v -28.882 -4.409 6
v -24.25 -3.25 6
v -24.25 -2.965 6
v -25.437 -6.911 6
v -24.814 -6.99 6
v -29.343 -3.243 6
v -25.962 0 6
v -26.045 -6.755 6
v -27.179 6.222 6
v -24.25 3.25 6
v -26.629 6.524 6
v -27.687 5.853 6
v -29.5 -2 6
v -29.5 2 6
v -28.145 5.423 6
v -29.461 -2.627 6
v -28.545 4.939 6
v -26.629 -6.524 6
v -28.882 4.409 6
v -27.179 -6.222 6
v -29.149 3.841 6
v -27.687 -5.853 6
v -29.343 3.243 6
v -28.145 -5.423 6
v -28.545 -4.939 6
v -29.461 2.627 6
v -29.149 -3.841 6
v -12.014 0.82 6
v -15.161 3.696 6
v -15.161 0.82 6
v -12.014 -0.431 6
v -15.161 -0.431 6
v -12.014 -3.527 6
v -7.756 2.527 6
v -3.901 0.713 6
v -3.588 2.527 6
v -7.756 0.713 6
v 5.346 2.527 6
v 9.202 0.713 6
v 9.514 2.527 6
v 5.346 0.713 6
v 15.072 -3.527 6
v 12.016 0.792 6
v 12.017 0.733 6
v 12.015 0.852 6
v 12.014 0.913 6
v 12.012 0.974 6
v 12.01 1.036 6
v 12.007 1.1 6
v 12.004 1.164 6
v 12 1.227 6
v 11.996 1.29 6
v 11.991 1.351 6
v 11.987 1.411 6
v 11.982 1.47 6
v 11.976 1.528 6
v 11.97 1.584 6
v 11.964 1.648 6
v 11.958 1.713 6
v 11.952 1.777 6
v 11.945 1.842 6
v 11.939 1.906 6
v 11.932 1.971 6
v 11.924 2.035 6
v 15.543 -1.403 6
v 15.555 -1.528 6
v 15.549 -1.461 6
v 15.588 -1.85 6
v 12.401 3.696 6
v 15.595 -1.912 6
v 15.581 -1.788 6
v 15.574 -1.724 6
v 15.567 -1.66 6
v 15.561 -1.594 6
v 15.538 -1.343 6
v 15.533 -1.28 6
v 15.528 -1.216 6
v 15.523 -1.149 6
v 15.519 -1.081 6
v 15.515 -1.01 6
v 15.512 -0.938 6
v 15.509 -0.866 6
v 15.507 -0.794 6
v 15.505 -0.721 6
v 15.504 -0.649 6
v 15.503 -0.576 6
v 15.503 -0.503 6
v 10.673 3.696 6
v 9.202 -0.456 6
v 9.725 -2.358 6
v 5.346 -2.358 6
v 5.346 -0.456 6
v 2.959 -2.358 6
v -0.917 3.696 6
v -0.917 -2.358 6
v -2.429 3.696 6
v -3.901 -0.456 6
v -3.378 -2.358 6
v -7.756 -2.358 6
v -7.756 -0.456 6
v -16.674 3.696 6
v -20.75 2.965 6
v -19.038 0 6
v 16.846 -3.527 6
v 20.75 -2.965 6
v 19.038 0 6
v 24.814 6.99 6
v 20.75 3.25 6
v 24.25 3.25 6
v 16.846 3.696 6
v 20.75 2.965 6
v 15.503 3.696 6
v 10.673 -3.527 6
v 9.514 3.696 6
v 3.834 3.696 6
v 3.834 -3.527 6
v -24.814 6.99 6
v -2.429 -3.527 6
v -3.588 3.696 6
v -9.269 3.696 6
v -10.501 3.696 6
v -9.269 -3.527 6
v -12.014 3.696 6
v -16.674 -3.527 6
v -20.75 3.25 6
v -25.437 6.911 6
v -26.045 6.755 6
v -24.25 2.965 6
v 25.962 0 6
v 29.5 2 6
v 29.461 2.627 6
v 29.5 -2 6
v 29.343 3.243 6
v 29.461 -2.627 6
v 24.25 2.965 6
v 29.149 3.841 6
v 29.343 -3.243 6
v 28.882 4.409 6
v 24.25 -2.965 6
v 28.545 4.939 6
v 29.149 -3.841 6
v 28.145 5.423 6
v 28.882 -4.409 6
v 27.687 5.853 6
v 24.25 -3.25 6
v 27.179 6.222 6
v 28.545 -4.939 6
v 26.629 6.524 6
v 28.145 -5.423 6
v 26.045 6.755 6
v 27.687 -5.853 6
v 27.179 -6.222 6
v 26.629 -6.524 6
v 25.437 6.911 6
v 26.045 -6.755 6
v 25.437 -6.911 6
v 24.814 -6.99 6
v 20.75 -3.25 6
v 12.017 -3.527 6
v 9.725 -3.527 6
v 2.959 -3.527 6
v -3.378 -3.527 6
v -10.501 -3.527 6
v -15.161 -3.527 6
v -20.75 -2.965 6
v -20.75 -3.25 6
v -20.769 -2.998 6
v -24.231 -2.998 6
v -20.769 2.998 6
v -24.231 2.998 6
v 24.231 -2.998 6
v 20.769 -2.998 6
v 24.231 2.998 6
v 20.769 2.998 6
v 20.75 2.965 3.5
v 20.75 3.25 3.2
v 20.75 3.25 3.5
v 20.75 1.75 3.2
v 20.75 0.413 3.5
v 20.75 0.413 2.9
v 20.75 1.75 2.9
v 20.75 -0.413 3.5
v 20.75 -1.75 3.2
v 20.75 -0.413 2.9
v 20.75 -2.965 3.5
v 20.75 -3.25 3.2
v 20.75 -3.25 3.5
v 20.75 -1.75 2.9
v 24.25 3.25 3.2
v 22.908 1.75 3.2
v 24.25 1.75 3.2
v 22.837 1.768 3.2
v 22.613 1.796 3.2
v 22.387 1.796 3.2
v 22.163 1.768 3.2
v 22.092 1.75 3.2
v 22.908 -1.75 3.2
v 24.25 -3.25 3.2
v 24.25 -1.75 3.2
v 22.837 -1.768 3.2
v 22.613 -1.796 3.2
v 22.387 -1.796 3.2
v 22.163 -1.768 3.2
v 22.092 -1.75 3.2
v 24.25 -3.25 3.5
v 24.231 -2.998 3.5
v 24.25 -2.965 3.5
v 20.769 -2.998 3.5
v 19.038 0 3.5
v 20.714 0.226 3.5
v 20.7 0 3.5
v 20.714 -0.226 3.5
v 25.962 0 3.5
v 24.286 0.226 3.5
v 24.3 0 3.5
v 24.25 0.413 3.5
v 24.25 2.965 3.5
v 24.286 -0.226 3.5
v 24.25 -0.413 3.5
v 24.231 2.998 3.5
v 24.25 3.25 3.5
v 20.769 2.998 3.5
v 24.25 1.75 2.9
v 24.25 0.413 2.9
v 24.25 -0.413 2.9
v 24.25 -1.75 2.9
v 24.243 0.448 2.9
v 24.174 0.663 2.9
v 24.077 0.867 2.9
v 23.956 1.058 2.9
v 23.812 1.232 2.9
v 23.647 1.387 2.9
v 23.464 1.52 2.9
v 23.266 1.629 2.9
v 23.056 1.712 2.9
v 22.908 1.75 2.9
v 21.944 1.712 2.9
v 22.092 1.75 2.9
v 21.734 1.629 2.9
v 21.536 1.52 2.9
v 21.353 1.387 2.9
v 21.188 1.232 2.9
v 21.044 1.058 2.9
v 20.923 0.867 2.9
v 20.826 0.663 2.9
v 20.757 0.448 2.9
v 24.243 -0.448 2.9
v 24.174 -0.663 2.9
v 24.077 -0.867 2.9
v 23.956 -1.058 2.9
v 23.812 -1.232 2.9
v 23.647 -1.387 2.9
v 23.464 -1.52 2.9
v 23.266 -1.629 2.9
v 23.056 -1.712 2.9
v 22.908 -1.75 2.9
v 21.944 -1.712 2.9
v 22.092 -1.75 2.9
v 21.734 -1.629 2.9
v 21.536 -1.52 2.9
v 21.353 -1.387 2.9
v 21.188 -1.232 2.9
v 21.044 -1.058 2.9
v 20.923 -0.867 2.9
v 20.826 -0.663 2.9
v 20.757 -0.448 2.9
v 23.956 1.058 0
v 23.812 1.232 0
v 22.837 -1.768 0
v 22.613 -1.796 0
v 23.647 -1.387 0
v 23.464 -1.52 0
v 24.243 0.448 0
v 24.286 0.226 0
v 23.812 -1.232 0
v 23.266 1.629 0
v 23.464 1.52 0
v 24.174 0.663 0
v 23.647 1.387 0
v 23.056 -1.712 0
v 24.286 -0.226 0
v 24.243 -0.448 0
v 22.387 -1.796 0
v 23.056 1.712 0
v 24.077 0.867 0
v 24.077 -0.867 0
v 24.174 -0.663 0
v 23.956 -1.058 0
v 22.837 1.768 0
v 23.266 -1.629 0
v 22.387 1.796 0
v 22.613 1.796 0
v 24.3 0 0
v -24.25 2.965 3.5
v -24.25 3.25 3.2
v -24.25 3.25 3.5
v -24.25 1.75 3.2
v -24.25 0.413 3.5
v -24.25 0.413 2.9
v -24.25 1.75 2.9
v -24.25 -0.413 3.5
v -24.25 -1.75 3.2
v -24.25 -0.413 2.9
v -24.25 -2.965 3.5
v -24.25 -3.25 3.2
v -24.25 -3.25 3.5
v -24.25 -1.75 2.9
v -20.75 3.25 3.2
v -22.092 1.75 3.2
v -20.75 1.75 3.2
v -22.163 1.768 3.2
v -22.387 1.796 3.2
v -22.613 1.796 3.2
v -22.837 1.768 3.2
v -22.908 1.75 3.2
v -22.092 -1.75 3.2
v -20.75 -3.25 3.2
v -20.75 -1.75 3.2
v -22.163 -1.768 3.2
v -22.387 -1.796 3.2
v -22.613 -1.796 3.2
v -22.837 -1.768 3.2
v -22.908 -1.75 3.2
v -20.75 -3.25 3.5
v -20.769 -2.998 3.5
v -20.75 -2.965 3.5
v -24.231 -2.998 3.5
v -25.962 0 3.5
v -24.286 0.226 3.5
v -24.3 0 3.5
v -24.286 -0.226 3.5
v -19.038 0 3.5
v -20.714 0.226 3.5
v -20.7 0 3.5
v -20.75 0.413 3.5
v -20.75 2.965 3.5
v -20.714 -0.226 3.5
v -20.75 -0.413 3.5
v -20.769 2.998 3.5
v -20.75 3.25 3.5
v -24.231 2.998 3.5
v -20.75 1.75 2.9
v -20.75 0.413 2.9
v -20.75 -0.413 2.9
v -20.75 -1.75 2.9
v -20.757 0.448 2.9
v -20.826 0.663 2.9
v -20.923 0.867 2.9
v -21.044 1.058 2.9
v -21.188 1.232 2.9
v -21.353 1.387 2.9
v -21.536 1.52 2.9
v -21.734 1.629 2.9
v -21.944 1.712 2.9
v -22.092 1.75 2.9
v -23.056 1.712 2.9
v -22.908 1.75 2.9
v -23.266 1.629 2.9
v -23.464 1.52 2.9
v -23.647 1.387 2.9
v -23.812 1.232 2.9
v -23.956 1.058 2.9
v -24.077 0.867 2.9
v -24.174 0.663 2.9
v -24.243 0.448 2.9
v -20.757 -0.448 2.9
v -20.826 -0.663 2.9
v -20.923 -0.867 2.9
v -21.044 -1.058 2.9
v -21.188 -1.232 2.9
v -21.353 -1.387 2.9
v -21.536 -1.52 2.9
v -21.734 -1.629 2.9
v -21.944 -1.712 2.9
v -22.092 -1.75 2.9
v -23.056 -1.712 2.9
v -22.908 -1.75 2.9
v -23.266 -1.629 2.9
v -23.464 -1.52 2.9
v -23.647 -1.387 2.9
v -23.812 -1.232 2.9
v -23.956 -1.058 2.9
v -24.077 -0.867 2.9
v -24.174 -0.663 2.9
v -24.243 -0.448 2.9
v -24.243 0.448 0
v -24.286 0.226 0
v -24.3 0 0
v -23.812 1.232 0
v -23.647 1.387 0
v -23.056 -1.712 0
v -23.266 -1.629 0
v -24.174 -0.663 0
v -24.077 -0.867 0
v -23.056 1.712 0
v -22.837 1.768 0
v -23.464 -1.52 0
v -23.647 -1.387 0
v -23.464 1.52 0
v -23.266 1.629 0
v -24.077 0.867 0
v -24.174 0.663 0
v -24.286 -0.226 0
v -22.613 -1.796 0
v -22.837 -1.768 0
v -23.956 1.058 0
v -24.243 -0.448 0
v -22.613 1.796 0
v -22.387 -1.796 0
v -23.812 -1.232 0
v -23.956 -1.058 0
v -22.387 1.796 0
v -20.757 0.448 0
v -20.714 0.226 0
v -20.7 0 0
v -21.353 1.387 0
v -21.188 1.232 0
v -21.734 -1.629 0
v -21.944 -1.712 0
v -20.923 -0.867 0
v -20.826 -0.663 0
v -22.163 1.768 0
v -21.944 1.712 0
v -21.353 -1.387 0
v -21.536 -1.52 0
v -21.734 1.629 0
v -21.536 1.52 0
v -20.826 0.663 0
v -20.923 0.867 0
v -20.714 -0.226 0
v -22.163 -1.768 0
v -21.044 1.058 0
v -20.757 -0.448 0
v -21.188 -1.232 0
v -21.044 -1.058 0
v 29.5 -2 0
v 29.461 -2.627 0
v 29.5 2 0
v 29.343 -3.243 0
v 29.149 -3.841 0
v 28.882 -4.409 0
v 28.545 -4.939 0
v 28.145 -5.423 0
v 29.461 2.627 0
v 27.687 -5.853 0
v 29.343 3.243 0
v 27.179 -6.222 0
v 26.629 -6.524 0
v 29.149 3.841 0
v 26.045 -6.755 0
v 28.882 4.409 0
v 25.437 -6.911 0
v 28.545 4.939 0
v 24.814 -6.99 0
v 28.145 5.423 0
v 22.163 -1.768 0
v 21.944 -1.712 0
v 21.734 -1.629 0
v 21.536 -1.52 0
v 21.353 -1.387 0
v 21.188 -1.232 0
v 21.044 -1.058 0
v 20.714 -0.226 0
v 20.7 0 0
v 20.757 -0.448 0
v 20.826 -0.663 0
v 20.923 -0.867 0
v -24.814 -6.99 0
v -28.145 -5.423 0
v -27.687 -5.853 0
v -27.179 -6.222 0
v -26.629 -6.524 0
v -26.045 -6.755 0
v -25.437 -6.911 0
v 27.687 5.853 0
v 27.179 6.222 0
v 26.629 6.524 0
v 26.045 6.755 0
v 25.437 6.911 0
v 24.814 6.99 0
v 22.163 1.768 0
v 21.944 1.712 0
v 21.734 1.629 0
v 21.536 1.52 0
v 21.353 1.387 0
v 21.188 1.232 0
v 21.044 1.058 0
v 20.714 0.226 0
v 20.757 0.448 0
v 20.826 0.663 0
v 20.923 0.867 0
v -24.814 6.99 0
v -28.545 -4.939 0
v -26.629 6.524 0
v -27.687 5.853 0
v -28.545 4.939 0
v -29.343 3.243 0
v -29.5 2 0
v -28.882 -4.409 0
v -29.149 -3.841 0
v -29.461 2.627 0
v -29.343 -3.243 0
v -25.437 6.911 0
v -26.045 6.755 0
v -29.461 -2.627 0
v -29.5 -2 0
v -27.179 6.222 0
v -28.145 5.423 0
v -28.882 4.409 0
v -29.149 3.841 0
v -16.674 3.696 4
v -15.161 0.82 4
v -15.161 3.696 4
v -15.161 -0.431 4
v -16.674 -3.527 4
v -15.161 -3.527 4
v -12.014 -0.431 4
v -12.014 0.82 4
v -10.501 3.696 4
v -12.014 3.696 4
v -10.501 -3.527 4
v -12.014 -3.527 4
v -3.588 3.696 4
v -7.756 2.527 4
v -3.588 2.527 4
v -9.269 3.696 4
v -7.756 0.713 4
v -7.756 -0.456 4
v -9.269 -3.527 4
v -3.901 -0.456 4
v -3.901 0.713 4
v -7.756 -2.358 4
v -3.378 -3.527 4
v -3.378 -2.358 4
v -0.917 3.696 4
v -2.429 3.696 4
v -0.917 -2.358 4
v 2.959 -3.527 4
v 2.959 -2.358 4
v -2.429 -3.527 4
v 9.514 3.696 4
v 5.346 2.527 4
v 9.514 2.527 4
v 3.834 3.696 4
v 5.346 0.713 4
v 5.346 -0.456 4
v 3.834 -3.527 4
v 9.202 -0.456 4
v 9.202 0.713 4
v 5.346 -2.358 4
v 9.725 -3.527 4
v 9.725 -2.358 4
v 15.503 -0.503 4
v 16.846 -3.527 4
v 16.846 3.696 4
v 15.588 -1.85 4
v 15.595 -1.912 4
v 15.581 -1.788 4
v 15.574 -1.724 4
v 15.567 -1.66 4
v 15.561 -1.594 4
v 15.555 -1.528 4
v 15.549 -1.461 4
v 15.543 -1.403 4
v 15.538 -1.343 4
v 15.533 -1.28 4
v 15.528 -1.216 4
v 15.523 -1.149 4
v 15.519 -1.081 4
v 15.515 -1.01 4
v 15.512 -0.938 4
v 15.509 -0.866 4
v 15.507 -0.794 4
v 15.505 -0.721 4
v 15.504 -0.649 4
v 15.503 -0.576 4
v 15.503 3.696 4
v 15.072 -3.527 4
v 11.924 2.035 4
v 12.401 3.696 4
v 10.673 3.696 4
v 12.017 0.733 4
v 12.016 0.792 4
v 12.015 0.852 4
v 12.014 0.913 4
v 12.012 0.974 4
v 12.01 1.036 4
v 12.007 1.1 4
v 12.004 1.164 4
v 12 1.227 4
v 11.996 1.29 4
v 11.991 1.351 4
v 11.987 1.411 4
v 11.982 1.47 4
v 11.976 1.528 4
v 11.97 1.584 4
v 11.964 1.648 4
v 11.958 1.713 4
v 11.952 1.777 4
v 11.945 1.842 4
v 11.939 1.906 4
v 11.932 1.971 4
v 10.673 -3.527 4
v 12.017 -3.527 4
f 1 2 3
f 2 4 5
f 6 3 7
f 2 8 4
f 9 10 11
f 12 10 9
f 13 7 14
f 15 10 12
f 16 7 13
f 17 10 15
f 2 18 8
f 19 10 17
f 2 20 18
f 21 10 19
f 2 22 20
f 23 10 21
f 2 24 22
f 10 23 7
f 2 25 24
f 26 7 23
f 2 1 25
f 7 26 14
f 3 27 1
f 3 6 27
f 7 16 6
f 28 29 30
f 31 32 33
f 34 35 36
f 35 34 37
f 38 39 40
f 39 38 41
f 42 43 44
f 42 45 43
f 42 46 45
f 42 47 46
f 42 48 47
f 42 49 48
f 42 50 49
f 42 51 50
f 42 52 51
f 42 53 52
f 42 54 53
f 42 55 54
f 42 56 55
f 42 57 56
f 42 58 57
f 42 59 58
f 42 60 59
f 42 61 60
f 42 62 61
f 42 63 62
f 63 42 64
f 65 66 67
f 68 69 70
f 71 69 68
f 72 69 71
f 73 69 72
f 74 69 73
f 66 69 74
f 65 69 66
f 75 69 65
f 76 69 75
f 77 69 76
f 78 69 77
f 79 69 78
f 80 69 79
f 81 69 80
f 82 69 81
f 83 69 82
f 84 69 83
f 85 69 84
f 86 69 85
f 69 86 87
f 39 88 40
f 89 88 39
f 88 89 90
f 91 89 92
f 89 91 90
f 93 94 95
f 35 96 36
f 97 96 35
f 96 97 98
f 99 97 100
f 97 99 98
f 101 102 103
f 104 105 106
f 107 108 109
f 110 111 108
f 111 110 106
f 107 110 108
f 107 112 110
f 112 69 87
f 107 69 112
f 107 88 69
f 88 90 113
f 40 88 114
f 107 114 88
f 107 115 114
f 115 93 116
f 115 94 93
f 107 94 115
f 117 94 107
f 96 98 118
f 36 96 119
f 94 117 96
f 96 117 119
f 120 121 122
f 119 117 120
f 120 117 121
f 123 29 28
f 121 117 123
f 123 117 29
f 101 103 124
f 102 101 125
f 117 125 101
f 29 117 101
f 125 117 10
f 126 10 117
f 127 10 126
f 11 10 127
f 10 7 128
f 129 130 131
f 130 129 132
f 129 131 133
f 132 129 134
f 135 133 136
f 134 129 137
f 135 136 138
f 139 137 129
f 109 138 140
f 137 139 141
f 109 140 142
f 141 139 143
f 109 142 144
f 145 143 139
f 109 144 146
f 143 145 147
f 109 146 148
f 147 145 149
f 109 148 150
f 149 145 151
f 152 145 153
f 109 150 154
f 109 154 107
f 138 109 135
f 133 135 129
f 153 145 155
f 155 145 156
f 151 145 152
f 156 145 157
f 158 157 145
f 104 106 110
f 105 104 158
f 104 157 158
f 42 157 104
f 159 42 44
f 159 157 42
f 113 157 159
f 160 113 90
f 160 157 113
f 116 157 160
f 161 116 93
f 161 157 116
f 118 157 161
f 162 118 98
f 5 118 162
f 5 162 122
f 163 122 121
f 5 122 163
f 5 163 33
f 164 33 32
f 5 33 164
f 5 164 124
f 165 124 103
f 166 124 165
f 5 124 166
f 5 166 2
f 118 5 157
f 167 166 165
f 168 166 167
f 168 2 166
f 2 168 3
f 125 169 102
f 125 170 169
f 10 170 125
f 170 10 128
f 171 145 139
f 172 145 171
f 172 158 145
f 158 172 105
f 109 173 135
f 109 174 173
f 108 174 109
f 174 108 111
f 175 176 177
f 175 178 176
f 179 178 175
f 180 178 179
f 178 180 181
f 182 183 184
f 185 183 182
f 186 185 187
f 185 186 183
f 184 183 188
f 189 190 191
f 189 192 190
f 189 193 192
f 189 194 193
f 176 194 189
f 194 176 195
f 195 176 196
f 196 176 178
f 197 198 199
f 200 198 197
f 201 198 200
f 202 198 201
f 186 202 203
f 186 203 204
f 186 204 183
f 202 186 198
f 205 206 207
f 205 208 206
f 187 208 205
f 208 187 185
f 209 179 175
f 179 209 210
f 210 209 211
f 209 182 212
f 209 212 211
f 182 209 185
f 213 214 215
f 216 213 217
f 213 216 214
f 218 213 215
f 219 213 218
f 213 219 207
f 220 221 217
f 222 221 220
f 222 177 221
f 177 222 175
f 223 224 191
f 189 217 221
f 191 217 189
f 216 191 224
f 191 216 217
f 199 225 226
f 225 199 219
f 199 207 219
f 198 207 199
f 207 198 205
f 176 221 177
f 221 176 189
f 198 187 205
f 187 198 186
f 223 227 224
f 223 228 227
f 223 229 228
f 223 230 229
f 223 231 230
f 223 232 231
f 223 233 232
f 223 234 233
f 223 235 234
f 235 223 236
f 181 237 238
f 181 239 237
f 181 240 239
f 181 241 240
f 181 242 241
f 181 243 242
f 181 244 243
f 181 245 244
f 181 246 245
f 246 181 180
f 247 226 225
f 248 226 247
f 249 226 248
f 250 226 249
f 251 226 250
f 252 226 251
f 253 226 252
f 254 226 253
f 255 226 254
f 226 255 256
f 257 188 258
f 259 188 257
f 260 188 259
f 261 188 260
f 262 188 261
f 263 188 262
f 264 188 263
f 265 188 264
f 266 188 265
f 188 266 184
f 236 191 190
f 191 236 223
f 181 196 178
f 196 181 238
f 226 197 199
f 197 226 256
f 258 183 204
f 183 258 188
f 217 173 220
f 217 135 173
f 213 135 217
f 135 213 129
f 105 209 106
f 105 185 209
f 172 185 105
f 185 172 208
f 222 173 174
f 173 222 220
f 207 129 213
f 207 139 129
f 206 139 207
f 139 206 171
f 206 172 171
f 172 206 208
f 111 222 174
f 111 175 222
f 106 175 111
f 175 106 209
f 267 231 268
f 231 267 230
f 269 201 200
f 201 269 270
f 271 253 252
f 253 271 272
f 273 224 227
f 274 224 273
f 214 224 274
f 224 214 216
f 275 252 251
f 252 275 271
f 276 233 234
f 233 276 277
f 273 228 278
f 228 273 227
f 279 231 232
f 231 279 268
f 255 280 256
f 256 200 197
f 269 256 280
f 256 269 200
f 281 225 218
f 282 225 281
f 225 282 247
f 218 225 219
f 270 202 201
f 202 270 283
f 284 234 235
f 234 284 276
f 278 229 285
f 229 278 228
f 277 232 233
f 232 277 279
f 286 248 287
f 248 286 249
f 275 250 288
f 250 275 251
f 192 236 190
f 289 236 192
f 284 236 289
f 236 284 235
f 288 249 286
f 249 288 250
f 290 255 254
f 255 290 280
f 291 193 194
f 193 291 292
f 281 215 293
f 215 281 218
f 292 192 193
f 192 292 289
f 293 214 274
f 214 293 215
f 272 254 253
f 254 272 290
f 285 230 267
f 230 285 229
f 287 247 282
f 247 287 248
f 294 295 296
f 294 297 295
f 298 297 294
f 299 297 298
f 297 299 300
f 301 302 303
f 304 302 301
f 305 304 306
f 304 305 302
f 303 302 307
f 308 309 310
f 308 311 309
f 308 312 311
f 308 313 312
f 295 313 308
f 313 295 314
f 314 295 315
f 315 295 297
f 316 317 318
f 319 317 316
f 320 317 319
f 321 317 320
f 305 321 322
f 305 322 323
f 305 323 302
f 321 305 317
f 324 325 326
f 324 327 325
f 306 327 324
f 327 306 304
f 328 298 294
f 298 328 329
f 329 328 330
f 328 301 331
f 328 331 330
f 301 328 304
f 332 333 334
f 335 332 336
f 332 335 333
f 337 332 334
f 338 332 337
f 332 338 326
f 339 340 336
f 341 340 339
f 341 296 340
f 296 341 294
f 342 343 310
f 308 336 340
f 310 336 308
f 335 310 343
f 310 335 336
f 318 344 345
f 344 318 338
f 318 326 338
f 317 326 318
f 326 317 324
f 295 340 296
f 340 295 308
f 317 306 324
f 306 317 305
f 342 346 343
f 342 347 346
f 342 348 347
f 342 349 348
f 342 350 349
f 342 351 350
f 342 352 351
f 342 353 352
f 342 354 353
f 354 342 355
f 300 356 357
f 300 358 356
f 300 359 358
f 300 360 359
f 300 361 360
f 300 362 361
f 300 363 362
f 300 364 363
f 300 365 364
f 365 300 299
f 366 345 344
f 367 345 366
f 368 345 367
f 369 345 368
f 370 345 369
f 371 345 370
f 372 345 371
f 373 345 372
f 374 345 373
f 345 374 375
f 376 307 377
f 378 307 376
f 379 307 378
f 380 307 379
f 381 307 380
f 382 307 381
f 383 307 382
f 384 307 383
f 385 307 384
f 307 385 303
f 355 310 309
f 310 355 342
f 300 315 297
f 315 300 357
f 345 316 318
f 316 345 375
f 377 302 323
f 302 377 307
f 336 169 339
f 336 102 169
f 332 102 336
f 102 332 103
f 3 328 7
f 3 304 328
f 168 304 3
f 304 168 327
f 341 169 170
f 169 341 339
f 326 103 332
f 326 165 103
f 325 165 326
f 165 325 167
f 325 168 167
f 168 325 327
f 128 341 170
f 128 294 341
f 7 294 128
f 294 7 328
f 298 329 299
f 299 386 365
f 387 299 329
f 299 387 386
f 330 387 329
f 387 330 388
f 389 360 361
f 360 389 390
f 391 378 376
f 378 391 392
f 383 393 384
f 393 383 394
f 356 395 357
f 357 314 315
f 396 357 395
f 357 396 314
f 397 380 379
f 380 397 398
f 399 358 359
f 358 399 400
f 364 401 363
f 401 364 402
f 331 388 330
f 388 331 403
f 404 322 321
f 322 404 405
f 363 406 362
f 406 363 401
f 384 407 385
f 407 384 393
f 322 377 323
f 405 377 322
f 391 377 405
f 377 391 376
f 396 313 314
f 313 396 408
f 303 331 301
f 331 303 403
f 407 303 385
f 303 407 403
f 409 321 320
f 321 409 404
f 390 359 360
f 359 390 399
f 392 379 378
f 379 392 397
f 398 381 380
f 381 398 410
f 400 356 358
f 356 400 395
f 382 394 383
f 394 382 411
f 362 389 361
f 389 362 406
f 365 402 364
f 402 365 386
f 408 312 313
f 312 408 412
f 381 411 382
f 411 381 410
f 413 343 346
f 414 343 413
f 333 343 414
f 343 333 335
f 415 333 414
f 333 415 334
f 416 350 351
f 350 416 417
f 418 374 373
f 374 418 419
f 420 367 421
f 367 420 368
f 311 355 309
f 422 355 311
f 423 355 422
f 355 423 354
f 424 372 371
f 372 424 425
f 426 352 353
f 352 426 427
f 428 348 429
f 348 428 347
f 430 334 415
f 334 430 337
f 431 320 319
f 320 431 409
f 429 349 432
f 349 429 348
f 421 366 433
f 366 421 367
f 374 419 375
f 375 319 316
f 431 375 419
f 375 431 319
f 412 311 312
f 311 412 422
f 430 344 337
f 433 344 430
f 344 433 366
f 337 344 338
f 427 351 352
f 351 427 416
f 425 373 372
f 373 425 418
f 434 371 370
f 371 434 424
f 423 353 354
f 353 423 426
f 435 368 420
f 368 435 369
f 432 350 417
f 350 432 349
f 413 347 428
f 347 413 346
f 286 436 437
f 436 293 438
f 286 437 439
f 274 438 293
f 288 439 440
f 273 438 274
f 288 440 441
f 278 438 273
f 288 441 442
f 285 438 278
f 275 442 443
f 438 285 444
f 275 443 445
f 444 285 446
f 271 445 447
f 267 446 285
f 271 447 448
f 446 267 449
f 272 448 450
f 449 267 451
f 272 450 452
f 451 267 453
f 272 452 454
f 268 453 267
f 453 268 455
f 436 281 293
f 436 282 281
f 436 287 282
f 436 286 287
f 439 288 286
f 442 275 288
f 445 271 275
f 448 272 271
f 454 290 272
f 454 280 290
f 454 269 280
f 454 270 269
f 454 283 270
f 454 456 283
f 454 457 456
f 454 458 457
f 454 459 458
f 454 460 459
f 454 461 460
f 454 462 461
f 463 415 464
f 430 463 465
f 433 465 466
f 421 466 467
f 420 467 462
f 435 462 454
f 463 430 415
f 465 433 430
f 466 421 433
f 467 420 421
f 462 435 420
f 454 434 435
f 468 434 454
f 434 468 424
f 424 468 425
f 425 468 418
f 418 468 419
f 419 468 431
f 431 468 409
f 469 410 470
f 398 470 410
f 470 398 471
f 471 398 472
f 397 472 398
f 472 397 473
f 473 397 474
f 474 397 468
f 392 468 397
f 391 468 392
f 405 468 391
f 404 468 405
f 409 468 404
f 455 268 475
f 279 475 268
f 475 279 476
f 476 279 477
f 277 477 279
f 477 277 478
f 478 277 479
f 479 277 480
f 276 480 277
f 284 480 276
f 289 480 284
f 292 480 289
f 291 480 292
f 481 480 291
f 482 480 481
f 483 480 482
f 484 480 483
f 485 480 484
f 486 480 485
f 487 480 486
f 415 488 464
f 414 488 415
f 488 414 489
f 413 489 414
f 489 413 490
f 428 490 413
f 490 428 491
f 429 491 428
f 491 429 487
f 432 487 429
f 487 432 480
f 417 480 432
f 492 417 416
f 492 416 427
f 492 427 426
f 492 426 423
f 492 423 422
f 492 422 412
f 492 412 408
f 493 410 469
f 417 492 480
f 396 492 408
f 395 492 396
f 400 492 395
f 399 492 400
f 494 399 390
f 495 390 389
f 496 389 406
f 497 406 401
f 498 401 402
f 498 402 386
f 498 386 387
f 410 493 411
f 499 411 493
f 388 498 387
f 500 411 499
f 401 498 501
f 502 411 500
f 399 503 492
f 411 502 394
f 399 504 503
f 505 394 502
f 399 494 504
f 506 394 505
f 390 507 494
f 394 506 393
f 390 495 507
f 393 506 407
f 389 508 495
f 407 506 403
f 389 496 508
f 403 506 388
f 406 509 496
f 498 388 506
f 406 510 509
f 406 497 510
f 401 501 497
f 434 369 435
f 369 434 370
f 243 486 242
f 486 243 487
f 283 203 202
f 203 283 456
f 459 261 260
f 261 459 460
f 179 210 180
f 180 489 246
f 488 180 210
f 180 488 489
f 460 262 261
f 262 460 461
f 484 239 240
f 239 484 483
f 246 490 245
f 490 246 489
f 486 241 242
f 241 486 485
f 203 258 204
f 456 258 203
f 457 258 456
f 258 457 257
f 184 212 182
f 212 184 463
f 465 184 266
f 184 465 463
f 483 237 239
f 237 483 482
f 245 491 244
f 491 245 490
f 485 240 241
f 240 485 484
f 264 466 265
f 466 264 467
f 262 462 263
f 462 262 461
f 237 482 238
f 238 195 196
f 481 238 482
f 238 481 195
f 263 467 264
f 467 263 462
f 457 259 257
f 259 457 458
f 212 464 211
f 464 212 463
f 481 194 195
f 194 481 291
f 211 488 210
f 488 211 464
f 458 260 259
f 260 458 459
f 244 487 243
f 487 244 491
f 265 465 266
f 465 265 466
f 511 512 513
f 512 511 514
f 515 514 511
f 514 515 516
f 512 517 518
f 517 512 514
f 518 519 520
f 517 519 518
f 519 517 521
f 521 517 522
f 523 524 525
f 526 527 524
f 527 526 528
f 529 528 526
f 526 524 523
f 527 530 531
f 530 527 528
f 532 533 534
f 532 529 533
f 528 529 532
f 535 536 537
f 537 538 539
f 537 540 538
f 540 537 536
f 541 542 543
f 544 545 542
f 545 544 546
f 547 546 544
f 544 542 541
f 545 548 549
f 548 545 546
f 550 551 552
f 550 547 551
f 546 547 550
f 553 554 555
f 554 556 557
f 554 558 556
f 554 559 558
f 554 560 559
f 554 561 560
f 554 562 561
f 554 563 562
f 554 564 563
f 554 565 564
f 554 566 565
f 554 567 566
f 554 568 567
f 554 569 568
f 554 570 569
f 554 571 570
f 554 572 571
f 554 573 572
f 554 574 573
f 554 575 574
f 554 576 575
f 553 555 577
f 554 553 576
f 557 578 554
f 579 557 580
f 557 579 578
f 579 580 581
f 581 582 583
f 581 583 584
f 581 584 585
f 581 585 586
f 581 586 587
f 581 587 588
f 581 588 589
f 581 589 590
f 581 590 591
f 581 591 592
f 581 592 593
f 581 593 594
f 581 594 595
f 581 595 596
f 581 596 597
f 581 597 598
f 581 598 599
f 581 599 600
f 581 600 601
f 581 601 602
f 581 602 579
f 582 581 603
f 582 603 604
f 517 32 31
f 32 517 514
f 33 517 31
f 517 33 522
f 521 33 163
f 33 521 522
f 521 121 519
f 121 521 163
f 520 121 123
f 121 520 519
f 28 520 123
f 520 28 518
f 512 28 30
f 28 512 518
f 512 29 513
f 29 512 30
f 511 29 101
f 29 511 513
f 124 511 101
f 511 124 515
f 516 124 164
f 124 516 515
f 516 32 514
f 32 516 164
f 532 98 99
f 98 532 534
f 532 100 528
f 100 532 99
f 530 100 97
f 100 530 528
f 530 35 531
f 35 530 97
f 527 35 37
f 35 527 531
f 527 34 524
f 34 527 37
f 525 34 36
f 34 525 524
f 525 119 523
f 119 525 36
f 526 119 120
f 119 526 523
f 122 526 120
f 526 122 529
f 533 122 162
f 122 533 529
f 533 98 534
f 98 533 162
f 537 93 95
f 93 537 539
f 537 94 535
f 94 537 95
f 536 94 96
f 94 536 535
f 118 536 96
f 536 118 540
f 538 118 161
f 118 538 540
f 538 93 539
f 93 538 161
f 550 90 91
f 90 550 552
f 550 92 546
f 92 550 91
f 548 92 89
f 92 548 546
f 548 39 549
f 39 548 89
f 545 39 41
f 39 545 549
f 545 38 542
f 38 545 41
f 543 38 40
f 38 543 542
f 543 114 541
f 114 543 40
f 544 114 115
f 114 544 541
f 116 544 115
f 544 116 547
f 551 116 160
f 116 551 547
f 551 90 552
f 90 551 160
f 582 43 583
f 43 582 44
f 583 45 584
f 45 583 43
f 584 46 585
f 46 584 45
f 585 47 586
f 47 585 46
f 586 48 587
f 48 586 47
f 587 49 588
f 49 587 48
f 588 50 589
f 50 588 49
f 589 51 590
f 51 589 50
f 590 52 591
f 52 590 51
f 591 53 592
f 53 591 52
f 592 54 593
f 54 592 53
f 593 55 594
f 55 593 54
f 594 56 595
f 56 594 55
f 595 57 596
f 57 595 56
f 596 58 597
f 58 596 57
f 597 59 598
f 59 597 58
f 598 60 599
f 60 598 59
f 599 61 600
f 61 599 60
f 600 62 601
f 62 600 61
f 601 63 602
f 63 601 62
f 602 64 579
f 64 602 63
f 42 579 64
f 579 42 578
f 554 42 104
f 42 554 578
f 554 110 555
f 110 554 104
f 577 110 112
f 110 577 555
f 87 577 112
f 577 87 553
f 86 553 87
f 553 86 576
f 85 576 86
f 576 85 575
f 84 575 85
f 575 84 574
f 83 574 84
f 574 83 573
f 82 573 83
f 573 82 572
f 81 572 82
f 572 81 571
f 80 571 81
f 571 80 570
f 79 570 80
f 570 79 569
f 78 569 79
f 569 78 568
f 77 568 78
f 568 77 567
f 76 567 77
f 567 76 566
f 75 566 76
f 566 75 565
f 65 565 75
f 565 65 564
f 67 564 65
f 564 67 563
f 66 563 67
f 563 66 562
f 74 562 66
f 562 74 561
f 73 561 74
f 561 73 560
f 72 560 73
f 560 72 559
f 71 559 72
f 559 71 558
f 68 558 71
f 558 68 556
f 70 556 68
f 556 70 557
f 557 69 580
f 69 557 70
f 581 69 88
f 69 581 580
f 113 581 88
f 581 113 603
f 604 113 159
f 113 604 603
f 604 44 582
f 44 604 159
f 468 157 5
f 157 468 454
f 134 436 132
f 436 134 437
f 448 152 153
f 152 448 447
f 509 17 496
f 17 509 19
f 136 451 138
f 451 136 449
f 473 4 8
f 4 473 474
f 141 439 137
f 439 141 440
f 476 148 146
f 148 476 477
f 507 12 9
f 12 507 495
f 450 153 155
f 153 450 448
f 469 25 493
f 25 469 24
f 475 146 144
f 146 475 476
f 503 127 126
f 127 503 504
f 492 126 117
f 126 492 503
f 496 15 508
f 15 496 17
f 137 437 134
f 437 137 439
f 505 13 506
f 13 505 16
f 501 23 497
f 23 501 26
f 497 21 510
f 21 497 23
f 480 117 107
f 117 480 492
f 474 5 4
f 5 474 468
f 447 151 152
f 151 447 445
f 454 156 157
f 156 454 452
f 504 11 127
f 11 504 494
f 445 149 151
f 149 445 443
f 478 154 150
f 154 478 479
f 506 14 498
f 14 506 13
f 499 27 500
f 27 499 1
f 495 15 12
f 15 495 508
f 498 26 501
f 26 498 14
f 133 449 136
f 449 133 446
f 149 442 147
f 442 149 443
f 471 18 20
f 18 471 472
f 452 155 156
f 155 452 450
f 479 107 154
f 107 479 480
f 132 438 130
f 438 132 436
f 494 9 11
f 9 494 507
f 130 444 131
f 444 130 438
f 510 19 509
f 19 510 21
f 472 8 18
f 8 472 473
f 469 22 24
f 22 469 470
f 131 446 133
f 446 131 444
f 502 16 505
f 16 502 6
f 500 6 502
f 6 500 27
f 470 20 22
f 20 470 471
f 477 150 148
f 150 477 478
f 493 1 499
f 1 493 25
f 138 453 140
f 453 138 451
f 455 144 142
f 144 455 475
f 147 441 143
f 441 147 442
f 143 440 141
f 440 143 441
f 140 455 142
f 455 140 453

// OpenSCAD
$fn = 50;


difference() {
	union() {
		hull() {
			translate(v = [-24.5000000000, 2.0000000000, 0]) {
				cylinder(h = 6, r = 5);
			}
			translate(v = [24.5000000000, 2.0000000000, 0]) {
				cylinder(h = 6, r = 5);
			}
			translate(v = [-24.5000000000, -2.0000000000, 0]) {
				cylinder(h = 6, r = 5);
			}
			translate(v = [24.5000000000, -2.0000000000, 0]) {
				cylinder(h = 6, r = 5);
			}
		}
	}
	union() {
		translate(v = [22.5000000000, 0, -20]) {
			rotate(a = [0, 180, 0]) {
				difference() {
					union() {
						translate(v = [0, 0, -26.0000000000]) {
							rotate(a = [0, 0, 0]) {
								difference() {
									union() {
										#translate(v = [-1.7500000000, -3.2500000000, -0.3000000000]) {
											cube(size = [3.5000000000, 6.5000000000, 0.3000000000]);
										}
										#translate(v = [-1.7500000000, -1.7500000000, -0.6000000000]) {
											cube(size = [3.5000000000, 3.5000000000, 0.3000000000]);
										}
										#translate(v = [-1.7500000000, -3.2500000000, 2.5000000000]) {
											cube(size = [3.5000000000, 6.5000000000, 0.3000000000]);
										}
										#translate(v = [-1.7500000000, -1.7500000000, 2.8000000000]) {
											cube(size = [3.5000000000, 3.5000000000, 0.3000000000]);
										}
										#linear_extrude(height = 2.5000000000) {
											polygon(points = [[3.4620000000, 0.0000000000], [1.7310000000, 2.9981799479], [-1.7310000000, 2.9981799479], [-3.4620000000, 0.0000000000], [-1.7310000000, -2.9981799479], [1.7310000000, -2.9981799479]]);
										}
										#translate(v = [-1.7500000000, -3.2500000000, -0.3000000000]) {
											cube(size = [3.5000000000, 6.5000000000, 0.3000000000]);
										}
										#translate(v = [-1.7500000000, -1.7500000000, -0.6000000000]) {
											cube(size = [3.5000000000, 3.5000000000, 0.3000000000]);
										}
										#translate(v = [-1.7500000000, -3.2500000000, 2.5000000000]) {
											cube(size = [3.5000000000, 6.5000000000, 0.3000000000]);
										}
										#translate(v = [-1.7500000000, -1.7500000000, 2.8000000000]) {
											cube(size = [3.5000000000, 3.5000000000, 0.3000000000]);
										}
										#translate(v = [-1.7500000000, -3.2500000000, -0.3000000000]) {
											cube(size = [3.5000000000, 6.5000000000, 0.3000000000]);
										}
										#translate(v = [-1.7500000000, -1.7500000000, -0.6000000000]) {
											cube(size = [3.5000000000, 3.5000000000, 0.3000000000]);
										}
										#translate(v = [-1.7500000000, -3.2500000000, 2.5000000000]) {
											cube(size = [3.5000000000, 6.5000000000, 0.3000000000]);
										}
										#translate(v = [-1.7500000000, -1.7500000000, 2.8000000000]) {
											cube(size = [3.5000000000, 3.5000000000, 0.3000000000]);
										}
									}
									union();
								}
							}
						}
						translate(v = [0, 0, -26.0000000000]) {
							rotate(a = [0, 0, 0]) {
								difference() {
									union() {
										#translate(v = [-1.7500000000, -3.2500000000, -0.3000000000]) {
											cube(size = [3.5000000000, 6.5000000000, 0.3000000000]);
										}
										#translate(v = [-1.7500000000, -1.7500000000, -0.6000000000]) {
											cube(size = [3.5000000000, 3.5000000000, 0.3000000000]);
										}
										#translate(v = [-1.7500000000, -3.2500000000, 2.5000000000]) {
											cube(size = [3.5000000000, 6.5000000000, 0.3000000000]);
										}
										#translate(v = [-1.7500000000, -1.7500000000, 2.8000000000]) {
											cube(size = [3.5000000000, 3.5000000000, 0.3000000000]);
										}
										#linear_extrude(height = 2.5000000000) {
											polygon(points = [[3.4620000000, 0.0000000000], [1.7310000000, 2.9981799479], [-1.7310000000, 2.9981799479], [-3.4620000000, 0.0000000000], [-1.7310000000, -2.9981799479], [1.7310000000, -2.9981799479]]);
										}
										#translate(v = [-1.7500000000, -3.2500000000, -0.3000000000]) {
											cube(size = [3.5000000000, 6.5000000000, 0.3000000000]);
										}
										#translate(v = [-1.7500000000, -1.7500000000, -0.6000000000]) {
											cube(size = [3.5000000000, 3.5000000000, 0.3000000000]);
										}
										#translate(v = [-1.7500000000, -3.2500000000, 2.5000000000]) {
											cube(size = [3.5000000000, 6.5000000000, 0.3000000000]);
										}
										#translate(v = [-1.7500000000, -1.7500000000, 2.8000000000]) {
											cube(size = [3.5000000000, 3.5000000000, 0.3000000000]);
										}
										#translate(v = [-1.7500000000, -3.2500000000, -0.3000000000]) {
											cube(size = [3.5000000000, 6.5000000000, 0.3000000000]);
										}
										#translate(v = [-1.7500000000, -1.7500000000, -0.6000000000]) {
											cube(size = [3.5000000000, 3.5000000000, 0.3000000000]);
										}
										#translate(v = [-1.7500000000, -3.2500000000, 2.5000000000]) {
											cube(size = [3.5000000000, 6.5000000000, 0.3000000000]);
										}
										#translate(v = [-1.7500000000, -1.7500000000, 2.8000000000]) {
											cube(size = [3.5000000000, 3.5000000000, 0.3000000000]);
										}
									}
									union();
								}
							}
						}
						translate(v = [0, 0, -26.0000000000]) {
							rotate(a = [0, 0, 0]) {
								difference() {
									union() {
										#translate(v = [-1.7500000000, -3.2500000000, -0.3000000000]) {
											cube(size = [3.5000000000, 6.5000000000, 0.3000000000]);
										}
										#translate(v = [-1.7500000000, -1.7500000000, -0.6000000000]) {
											cube(size = [3.5000000000, 3.5000000000, 0.3000000000]);
										}
										#translate(v = [-1.7500000000, -3.2500000000, 2.5000000000]) {
											cube(size = [3.5000000000, 6.5000000000, 0.3000000000]);
										}
										#translate(v = [-1.7500000000, -1.7500000000, 2.8000000000]) {
											cube(size = [3.5000000000, 3.5000000000, 0.3000000000]);
										}
										#linear_extrude(height = 2.5000000000) {
											polygon(points = [[3.4620000000, 0.0000000000], [1.7310000000, 2.9981799479], [-1.7310000000, 2.9981799479], [-3.4620000000, 0.0000000000], [-1.7310000000, -2.9981799479], [1.7310000000, -2.9981799479]]);
										}
										#translate(v = [-1.7500000000, -3.2500000000, -0.3000000000]) {
											cube(size = [3.5000000000, 6.5000000000, 0.3000000000]);
										}
										#translate(v = [-1.7500000000, -1.7500000000, -0.6000000000]) {
											cube(size = [3.5000000000, 3.5000000000, 0.3000000000]);
										}
										#translate(v = [-1.7500000000, -3.2500000000, 2.5000000000]) {
											cube(size = [3.5000000000, 6.5000000000, 0.3000000000]);
										}
										#translate(v = [-1.7500000000, -1.7500000000, 2.8000000000]) {
											cube(size = [3.5000000000, 3.5000000000, 0.3000000000]);
										}
										#translate(v = [-1.7500000000, -3.2500000000, -0.3000000000]) {
											cube(size = [3.5000000000, 6.5000000000, 0.3000000000]);
										}
										#translate(v = [-1.7500000000, -1.7500000000, -0.6000000000]) {
											cube(size = [3.5000000000, 3.5000000000, 0.3000000000]);
										}
										#translate(v = [-1.7500000000, -3.2500000000, 2.5000000000]) {
											cube(size = [3.5000000000, 6.5000000000, 0.3000000000]);
										}
										#translate(v = [-1.7500000000, -1.7500000000, 2.8000000000]) {
											cube(size = [3.5000000000, 3.5000000000, 0.3000000000]);
										}
									}
									union();
								}
							}
						}
						#translate(v = [0, 0, -26.0000000000]) {
							cylinder(h = 26, r = 1.5000000000);
						}
						#translate(v = [0, 0, -1.9000000000]) {
							cylinder(h = 1.9000000000, r1 = 1.8000000000, r2 = 3.6000000000);
						}
						#translate(v = [0, 0, -26.0000000000]) {
							cylinder(h = 26, r = 1.8000000000);
						}
						#translate(v = [0, 0, -26.0000000000]) {
							cylinder(h = 26, r = 1.5000000000);
						}
					}
					union();
				}
			}
		}
		translate(v = [-22.5000000000, 0, -20]) {
			rotate(a = [0, 180, 0]) {
				difference() {
					union() {
						translate(v = [0, 0, -26.0000000000]) {
							rotate(a = [0, 0, 0]) {
								difference() {
									union() {
										#translate(v = [-1.7500000000, -3.2500000000, -0.3000000000]) {
											cube(size = [3.5000000000, 6.5000000000, 0.3000000000]);
										}
										#translate(v = [-1.7500000000, -1.7500000000, -0.6000000000]) {
											cube(size = [3.5000000000, 3.5000000000, 0.3000000000]);
										}
										#translate(v = [-1.7500000000, -3.2500000000, 2.5000000000]) {
											cube(size = [3.5000000000, 6.5000000000, 0.3000000000]);
										}
										#translate(v = [-1.7500000000, -1.7500000000, 2.8000000000]) {
											cube(size = [3.5000000000, 3.5000000000, 0.3000000000]);
										}
										#linear_extrude(height = 2.5000000000) {
											polygon(points = [[3.4620000000, 0.0000000000], [1.7310000000, 2.9981799479], [-1.7310000000, 2.9981799479], [-3.4620000000, 0.0000000000], [-1.7310000000, -2.9981799479], [1.7310000000, -2.9981799479]]);
										}
										#translate(v = [-1.7500000000, -3.2500000000, -0.3000000000]) {
											cube(size = [3.5000000000, 6.5000000000, 0.3000000000]);
										}
										#translate(v = [-1.7500000000, -1.7500000000, -0.6000000000]) {
											cube(size = [3.5000000000, 3.5000000000, 0.3000000000]);
										}
										#translate(v = [-1.7500000000, -3.2500000000, 2.5000000000]) {
											cube(size = [3.5000000000, 6.5000000000, 0.3000000000]);
										}
										#translate(v = [-1.7500000000, -1.7500000000, 2.8000000000]) {
											cube(size = [3.5000000000, 3.5000000000, 0.3000000000]);
										}
										#translate(v = [-1.7500000000, -3.2500000000, -0.3000000000]) {
											cube(size = [3.5000000000, 6.5000000000, 0.3000000000]);
										}
										#translate(v = [-1.7500000000, -1.7500000000, -0.6000000000]) {
											cube(size = [3.5000000000, 3.5000000000, 0.3000000000]);
										}
										#translate(v = [-1.7500000000, -3.2500000000, 2.5000000000]) {
											cube(size = [3.5000000000, 6.5000000000, 0.3000000000]);
										}
										#translate(v = [-1.7500000000, -1.7500000000, 2.8000000000]) {
											cube(size = [3.5000000000, 3.5000000000, 0.3000000000]);
										}
									}
									union();
								}
							}
						}
						translate(v = [0, 0, -26.0000000000]) {
							rotate(a = [0, 0, 0]) {
								difference() {
									union() {
										#translate(v = [-1.7500000000, -3.2500000000, -0.3000000000]) {
											cube(size = [3.5000000000, 6.5000000000, 0.3000000000]);
										}
										#translate(v = [-1.7500000000, -1.7500000000, -0.6000000000]) {
											cube(size = [3.5000000000, 3.5000000000, 0.3000000000]);
										}
										#translate(v = [-1.7500000000, -3.2500000000, 2.5000000000]) {
											cube(size = [3.5000000000, 6.5000000000, 0.3000000000]);
										}
										#translate(v = [-1.7500000000, -1.7500000000, 2.8000000000]) {
											cube(size = [3.5000000000, 3.5000000000, 0.3000000000]);
										}
										#linear_extrude(height = 2.5000000000) {
											polygon(points = [[3.4620000000, 0.0000000000], [1.7310000000, 2.9981799479], [-1.7310000000, 2.9981799479], [-3.4620000000, 0.0000000000], [-1.7310000000, -2.9981799479], [1.7310000000, -2.9981799479]]);
										}
										#translate(v = [-1.7500000000, -3.2500000000, -0.3000000000]) {
											cube(size = [3.5000000000, 6.5000000000, 0.3000000000]);
										}
										#translate(v = [-1.7500000000, -1.7500000000, -0.6000000000]) {
											cube(size = [3.5000000000, 3.5000000000, 0.3000000000]);
										}
										#translate(v = [-1.7500000000, -3.2500000000, 2.5000000000]) {
											cube(size = [3.5000000000, 6.5000000000, 0.3000000000]);
										}
										#translate(v = [-1.7500000000, -1.7500000000, 2.8000000000]) {
											cube(size = [3.5000000000, 3.5000000000, 0.3000000000]);
										}
										#translate(v = [-1.7500000000, -3.2500000000, -0.3000000000]) {
											cube(size = [3.5000000000, 6.5000000000, 0.3000000000]);
										}
										#translate(v = [-1.7500000000, -1.7500000000, -0.6000000000]) {
											cube(size = [3.5000000000, 3.5000000000, 0.3000000000]);
										}
										#translate(v = [-1.7500000000, -3.2500000000, 2.5000000000]) {
											cube(size = [3.5000000000, 6.5000000000, 0.3000000000]);
										}
										#translate(v = [-1.7500000000, -1.7500000000, 2.8000000000]) {
											cube(size = [3.5000000000, 3.5000000000, 0.3000000000]);
										}
									}
									union();
								}
							}
						}
						translate(v = [0, 0, -26.0000000000]) {
							rotate(a = [0, 0, 0]) {
								difference() {
									union() {
										#translate(v = [-1.7500000000, -3.2500000000, -0.3000000000]) {
											cube(size = [3.5000000000, 6.5000000000, 0.3000000000]);
										}
										#translate(v = [-1.7500000000, -1.7500000000, -0.6000000000]) {
											cube(size = [3.5000000000, 3.5000000000, 0.3000000000]);
										}
										#translate(v = [-1.7500000000, -3.2500000000, 2.5000000000]) {
											cube(size = [3.5000000000, 6.5000000000, 0.3000000000]);
										}
										#translate(v = [-1.7500000000, -1.7500000000, 2.8000000000]) {
											cube(size = [3.5000000000, 3.5000000000, 0.3000000000]);
										}
										#linear_extrude(height = 2.5000000000) {
											polygon(points = [[3.4620000000, 0.0000000000], [1.7310000000, 2.9981799479], [-1.7310000000, 2.9981799479], [-3.4620000000, 0.0000000000], [-1.7310000000, -2.9981799479], [1.7310000000, -2.9981799479]]);
										}
										#translate(v = [-1.7500000000, -3.2500000000, -0.3000000000]) {
											cube(size = [3.5000000000, 6.5000000000, 0.3000000000]);
										}
										#translate(v = [-1.7500000000, -1.7500000000, -0.6000000000]) {
											cube(size = [3.5000000000, 3.5000000000, 0.3000000000]);
										}
										#translate(v = [-1.7500000000, -3.2500000000, 2.5000000000]) {
											cube(size = [3.5000000000, 6.5000000000, 0.3000000000]);
										}
										#translate(v = [-1.7500000000, -1.7500000000, 2.8000000000]) {
											cube(size = [3.5000000000, 3.5000000000, 0.3000000000]);
										}
										#translate(v = [-1.7500000000, -3.2500000000, -0.3000000000]) {
											cube(size = [3.5000000000, 6.5000000000, 0.3000000000]);
										}
										#translate(v = [-1.7500000000, -1.7500000000, -0.6000000000]) {
											cube(size = [3.5000000000, 3.5000000000, 0.3000000000]);
										}
										#translate(v = [-1.7500000000, -3.2500000000, 2.5000000000]) {
											cube(size = [3.5000000000, 6.5000000000, 0.3000000000]);
										}
										#translate(v = [-1.7500000000, -1.7500000000, 2.8000000000]) {
											cube(size = [3.5000000000, 3.5000000000, 0.3000000000]);
										}
									}
									union();
								}
							}
						}
						#translate(v = [0, 0, -26.0000000000]) {
							cylinder(h = 26, r = 1.5000000000);
						}
						#translate(v = [0, 0, -1.9000000000]) {
							cylinder(h = 1.9000000000, r1 = 1.8000000000, r2 = 3.6000000000);
						}
						#translate(v = [0, 0, -26.0000000000]) {
							cylinder(h = 26, r = 1.8000000000);
						}
						#translate(v = [0, 0, -26.0000000000]) {
							cylinder(h = 26, r = 1.5000000000);
						}
					}
					union();
				}
			}
		}
		translate(v = [-22.5000000000, 0.0000000000, 0]) {
			cylinder(h = 6, r = 1.8000000000);
		}
		translate(v = [22.5000000000, 0.0000000000, 0]) {
			cylinder(h = 6, r = 1.8000000000);
		}
		translate(v = [-22.5000000000, 0.0000000000, 0]) {
			cylinder(h = 6, r = 1.8000000000);
		}
		translate(v = [22.5000000000, 0.0000000000, 0]) {
			cylinder(h = 6, r = 1.8000000000);
		}
		translate(v = [-22.5000000000, 0.0000000000, 0]) {
			cylinder(h = 6, r = 1.8000000000);
		}
		translate(v = [22.5000000000, 0.0000000000, 0]) {
			cylinder(h = 6, r = 1.8000000000);
		}
		translate(v = [-22.5000000000, 0.0000000000, 0]) {
			cylinder(h = 6, r = 1.8000000000);
		}
		translate(v = [22.5000000000, 0.0000000000, 0]) {
			cylinder(h = 6, r = 1.8000000000);
		}
		#translate(v = [0, 0, 4]) {
			linear_extrude(height = 2) {
				text(font = "Arial:Bold", halign = "center", size = 7.5600000000, text = "HELEN", valign = "center");
			}
		}
	}
}
